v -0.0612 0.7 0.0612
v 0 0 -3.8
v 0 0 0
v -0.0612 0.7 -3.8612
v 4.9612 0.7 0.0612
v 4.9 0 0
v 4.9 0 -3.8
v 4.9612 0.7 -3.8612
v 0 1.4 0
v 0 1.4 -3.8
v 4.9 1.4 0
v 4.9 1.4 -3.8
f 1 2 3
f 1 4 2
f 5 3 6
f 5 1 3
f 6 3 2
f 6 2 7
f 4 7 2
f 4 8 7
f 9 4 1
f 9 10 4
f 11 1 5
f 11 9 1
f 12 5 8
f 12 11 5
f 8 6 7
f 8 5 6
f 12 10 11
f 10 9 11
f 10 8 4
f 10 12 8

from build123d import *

# Parameters (mm, degrees)
ESQUISSE1_W        = 4.9
ESQUISSE1_H        = 3.8
BOSS_EXTRU_1_DEPTH = 0.7
BOSS_EXTRU_1_TAPER = -5
ESQUISSE2_W        = 5.022484128
ESQUISSE2_H        = 3.922484128
BOSS_EXTRU_2_DEPTH = 0.7
BOSS_EXTRU_2_TAPER = 5


with BuildPart() as part:
    # Esquisse1 → Boss.-Extru.1 (new body)
    with BuildSketch(Plane(origin=(0, 0, 0), x_dir=(1, 0, 0), z_dir=(0, 1, 0))):
        with Locations((2.45, 1.9)):
            Rectangle(ESQUISSE1_W, ESQUISSE1_H)
    extrude(amount=BOSS_EXTRU_1_DEPTH, taper=BOSS_EXTRU_1_TAPER)

    # Esquisse2 → Boss.-Extru.2 (add)
    with BuildSketch(Plane(origin=(0, 0.7, 0), x_dir=(1, 0, 0), z_dir=(0, 1, 0))):
        with Locations((2.45, 1.9)):
            Rectangle(ESQUISSE2_W, ESQUISSE2_H)
    extrude(amount=BOSS_EXTRU_2_DEPTH, taper=BOSS_EXTRU_2_TAPER)


solid = part.part
